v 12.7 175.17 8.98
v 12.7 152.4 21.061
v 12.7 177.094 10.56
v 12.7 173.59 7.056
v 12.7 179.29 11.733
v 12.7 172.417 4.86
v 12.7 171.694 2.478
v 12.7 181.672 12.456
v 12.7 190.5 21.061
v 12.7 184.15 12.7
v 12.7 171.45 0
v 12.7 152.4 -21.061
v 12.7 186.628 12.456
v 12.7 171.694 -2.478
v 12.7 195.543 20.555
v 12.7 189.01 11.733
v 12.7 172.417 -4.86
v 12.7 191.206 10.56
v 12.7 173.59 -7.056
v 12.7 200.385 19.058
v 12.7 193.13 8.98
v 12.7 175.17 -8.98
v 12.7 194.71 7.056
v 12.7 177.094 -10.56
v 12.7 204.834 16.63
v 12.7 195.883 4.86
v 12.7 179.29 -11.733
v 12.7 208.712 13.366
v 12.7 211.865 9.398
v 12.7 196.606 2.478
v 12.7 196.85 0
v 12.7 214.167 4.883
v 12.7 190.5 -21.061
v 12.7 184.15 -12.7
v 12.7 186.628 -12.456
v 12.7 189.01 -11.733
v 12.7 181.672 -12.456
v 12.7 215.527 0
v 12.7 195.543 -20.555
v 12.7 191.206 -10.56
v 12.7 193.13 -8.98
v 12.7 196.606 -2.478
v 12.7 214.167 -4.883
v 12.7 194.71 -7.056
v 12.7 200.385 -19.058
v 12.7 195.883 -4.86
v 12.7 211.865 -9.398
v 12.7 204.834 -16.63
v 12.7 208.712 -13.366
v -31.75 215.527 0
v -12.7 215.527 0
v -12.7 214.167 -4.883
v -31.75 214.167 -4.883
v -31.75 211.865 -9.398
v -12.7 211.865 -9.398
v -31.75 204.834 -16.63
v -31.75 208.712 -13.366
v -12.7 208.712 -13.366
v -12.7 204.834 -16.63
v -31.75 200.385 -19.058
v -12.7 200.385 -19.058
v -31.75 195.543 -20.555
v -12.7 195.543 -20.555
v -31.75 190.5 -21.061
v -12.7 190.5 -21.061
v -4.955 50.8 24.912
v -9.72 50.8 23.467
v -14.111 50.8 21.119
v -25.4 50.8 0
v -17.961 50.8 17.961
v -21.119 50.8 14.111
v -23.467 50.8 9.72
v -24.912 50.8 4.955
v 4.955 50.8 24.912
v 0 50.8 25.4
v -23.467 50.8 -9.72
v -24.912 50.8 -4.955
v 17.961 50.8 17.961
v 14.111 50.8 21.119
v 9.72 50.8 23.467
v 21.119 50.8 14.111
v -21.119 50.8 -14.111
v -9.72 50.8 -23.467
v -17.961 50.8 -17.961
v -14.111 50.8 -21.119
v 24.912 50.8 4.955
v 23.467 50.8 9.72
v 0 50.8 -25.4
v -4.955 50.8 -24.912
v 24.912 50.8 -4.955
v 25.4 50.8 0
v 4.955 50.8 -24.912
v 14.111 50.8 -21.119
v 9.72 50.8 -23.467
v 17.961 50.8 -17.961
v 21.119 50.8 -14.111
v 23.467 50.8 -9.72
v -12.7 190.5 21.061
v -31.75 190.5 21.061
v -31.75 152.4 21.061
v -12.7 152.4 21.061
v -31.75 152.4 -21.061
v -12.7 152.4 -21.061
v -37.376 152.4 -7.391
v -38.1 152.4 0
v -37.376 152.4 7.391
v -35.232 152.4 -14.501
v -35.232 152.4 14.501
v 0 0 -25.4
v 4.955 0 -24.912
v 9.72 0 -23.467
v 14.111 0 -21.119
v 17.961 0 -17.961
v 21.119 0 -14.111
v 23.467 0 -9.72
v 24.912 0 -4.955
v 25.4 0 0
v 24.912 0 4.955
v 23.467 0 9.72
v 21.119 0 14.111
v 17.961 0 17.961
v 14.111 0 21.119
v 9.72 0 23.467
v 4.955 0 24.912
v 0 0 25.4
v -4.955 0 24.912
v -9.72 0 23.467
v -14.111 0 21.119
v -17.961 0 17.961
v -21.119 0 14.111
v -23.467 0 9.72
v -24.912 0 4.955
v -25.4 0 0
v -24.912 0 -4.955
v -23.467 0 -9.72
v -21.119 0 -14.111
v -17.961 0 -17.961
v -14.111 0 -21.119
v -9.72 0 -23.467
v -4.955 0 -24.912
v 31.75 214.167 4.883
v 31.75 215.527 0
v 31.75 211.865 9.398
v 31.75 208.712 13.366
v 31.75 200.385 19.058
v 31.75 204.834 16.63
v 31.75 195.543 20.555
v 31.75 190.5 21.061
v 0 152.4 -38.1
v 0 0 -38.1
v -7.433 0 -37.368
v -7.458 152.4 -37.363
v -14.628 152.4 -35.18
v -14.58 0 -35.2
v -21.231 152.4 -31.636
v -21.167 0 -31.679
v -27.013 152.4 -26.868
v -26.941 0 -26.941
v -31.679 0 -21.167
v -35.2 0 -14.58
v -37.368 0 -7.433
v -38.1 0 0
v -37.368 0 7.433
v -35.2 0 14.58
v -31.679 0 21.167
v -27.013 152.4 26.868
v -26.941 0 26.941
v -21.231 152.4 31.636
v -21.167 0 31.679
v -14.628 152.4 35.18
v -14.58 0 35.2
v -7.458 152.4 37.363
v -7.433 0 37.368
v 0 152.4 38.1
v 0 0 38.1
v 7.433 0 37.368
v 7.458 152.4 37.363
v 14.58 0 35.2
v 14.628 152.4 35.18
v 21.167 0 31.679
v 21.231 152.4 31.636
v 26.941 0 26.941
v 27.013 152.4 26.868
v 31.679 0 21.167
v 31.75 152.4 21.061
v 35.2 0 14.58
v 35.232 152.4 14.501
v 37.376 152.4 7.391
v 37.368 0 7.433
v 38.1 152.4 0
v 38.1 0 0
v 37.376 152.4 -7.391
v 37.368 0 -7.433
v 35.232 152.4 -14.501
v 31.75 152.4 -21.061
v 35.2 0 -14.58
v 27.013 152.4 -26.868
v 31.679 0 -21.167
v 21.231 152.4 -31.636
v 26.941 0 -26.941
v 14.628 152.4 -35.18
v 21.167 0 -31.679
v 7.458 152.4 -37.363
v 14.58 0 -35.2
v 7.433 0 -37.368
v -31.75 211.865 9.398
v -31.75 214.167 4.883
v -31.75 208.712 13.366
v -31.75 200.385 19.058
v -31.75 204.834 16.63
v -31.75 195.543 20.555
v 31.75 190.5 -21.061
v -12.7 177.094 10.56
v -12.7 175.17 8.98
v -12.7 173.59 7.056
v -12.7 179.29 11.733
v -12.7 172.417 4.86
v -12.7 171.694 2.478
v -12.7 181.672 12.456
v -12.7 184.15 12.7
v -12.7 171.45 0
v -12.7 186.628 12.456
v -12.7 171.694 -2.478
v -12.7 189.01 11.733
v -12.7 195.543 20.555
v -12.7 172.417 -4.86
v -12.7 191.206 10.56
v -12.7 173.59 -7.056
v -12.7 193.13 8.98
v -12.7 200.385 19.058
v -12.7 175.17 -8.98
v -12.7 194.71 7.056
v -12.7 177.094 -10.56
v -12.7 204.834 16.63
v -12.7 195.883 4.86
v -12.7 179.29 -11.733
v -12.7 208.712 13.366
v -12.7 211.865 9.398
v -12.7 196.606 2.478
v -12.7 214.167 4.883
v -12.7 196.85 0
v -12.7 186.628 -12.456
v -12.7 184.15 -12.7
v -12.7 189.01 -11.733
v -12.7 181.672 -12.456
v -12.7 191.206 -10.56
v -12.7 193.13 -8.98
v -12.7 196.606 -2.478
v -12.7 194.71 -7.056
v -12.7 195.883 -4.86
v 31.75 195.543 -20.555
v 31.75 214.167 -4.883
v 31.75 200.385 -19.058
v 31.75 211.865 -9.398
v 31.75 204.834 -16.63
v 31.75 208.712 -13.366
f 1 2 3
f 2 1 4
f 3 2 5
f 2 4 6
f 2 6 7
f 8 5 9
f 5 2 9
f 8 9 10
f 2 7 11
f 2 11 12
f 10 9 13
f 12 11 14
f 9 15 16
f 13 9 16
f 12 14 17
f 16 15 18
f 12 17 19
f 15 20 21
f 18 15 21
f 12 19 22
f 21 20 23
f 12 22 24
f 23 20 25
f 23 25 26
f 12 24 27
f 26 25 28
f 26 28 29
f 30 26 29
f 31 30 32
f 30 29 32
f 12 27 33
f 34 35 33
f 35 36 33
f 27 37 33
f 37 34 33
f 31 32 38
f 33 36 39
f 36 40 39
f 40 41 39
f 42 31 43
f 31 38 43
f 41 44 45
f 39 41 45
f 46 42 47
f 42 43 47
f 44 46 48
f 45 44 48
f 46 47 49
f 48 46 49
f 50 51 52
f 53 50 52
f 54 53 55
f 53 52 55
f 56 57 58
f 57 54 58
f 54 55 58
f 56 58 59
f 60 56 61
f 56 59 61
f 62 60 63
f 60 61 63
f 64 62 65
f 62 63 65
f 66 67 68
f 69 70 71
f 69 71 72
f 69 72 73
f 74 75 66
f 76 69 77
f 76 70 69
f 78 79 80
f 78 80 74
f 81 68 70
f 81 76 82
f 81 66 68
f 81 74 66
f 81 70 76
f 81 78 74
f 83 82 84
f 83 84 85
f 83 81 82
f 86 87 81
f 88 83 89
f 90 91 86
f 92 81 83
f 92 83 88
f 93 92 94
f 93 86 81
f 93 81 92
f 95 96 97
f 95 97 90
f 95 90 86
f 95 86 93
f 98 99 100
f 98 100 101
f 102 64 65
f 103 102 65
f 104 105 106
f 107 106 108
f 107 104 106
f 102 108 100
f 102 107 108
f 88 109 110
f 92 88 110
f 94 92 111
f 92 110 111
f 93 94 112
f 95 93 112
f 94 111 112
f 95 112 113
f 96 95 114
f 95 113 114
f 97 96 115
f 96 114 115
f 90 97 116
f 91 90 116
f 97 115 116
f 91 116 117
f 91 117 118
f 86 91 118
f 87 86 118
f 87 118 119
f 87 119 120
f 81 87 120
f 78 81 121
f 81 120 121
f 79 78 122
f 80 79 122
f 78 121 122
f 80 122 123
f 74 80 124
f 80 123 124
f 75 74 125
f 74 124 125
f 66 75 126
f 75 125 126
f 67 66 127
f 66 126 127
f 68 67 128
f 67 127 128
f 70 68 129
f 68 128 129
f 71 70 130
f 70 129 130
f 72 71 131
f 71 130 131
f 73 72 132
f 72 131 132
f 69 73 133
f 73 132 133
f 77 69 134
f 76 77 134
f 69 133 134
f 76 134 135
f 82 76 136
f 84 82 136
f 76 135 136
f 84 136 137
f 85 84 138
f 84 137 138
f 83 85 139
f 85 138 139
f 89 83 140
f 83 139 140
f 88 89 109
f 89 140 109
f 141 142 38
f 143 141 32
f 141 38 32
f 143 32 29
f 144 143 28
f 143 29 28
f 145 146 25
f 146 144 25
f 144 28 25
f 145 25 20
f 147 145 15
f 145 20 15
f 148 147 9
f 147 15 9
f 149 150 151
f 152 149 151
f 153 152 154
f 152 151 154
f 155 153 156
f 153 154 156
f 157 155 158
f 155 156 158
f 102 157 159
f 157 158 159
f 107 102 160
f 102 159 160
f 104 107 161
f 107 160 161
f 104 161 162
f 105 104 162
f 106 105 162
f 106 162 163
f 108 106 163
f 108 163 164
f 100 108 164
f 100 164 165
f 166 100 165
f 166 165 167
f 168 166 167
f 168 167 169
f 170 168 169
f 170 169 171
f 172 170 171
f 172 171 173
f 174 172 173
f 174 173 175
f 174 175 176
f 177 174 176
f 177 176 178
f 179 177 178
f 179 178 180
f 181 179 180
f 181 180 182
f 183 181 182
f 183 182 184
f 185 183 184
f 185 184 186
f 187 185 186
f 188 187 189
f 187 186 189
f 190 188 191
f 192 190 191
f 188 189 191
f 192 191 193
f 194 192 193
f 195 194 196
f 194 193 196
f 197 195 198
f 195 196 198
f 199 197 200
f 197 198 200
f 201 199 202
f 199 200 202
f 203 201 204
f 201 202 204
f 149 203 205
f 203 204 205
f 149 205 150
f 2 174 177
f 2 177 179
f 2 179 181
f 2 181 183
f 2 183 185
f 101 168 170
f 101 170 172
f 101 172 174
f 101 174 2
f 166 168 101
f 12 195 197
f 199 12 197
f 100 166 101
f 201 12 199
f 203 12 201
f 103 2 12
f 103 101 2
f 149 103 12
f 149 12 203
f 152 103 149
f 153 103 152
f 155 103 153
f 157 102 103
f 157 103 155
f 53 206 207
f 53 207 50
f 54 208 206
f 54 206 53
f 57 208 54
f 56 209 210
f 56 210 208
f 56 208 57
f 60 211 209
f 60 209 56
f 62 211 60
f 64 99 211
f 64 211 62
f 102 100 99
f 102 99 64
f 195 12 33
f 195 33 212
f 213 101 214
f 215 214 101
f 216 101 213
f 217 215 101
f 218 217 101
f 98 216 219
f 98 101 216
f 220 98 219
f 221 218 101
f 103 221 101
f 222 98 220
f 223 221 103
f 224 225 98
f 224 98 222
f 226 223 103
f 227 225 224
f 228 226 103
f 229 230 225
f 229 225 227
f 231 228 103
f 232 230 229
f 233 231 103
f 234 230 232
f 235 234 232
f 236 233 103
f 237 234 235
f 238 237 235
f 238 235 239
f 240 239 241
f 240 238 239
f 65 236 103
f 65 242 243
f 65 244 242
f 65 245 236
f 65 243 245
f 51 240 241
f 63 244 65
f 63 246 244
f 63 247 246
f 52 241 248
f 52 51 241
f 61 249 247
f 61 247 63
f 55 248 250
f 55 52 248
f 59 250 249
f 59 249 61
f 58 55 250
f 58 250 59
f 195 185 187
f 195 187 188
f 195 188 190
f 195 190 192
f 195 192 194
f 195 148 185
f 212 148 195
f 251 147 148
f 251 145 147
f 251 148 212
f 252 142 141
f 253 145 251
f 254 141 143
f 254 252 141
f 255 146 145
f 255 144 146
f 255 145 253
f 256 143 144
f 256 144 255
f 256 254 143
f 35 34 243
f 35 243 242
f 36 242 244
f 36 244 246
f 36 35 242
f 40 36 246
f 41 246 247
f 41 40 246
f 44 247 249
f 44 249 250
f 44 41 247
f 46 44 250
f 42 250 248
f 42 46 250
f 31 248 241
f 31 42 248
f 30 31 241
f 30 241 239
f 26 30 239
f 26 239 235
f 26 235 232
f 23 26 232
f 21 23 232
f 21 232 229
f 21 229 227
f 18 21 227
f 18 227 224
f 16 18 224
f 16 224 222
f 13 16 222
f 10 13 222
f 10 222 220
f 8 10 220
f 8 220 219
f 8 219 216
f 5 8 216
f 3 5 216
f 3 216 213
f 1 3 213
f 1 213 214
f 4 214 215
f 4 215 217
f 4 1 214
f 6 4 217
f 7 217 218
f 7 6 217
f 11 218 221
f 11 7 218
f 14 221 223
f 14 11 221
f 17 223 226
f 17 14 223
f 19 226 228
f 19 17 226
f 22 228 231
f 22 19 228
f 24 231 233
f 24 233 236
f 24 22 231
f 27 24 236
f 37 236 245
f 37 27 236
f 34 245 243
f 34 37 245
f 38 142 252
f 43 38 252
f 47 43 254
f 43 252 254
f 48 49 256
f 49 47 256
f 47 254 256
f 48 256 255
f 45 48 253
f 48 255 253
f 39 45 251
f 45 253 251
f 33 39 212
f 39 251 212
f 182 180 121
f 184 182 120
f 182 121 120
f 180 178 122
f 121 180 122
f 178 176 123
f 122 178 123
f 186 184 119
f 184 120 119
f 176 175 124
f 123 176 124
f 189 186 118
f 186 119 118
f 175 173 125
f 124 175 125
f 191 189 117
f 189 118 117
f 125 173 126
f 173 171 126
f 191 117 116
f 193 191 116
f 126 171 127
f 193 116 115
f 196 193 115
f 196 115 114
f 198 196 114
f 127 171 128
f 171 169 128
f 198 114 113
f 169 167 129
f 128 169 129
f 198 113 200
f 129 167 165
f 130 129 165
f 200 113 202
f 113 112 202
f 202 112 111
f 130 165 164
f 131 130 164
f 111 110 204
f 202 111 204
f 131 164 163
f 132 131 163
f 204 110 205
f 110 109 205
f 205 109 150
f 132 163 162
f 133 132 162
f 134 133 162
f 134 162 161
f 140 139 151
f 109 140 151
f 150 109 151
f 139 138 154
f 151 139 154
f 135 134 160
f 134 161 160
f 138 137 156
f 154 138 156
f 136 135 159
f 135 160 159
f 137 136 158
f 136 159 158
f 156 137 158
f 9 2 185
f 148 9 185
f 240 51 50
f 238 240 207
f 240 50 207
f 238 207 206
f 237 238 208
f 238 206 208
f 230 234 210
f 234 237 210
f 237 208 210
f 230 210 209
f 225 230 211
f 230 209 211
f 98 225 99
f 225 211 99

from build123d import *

# Parameters (mm, degrees)
SKETCH1_R           = 38.1
BOSS_EXTRUDE1_DEPTH = 152.4
SKETCH2_W           = 63.5
SKETCH2_H           = 42.121134838
BOSS_EXTRUDE2_DEPTH = 63.5
SKETCH3_W           = 25.4
SKETCH3_H           = 42.121134838
CUT_EXTRUDE1_DEPTH  = 63.5
FILLET1_R           = 25.4
SKETCH5_R           = 25.4
CUT_EXTRUDE3_DEPTH  = 50.8
SKETCH4_R           = 12.7
BOSS_EXTRUDE3_DEPTH = 52.578


with BuildPart() as part:
    # Sketch1 → Boss-Extrude1 (new body)
    with BuildSketch(Plane(origin=(0, 0, 0), x_dir=(1, 0, 0), z_dir=(0, 1, 0))):
        with Locations(Location((0, 0, 0), (0, 0, 90))):
            Circle(SKETCH1_R)
    extrude(amount=BOSS_EXTRUDE1_DEPTH)

    # Sketch2 → Boss-Extrude2 (add)
    with BuildSketch(Plane(origin=(0, 152.4, 0), x_dir=(1, 0, 0), z_dir=(0, 1, 0))):
        Rectangle(SKETCH2_W, SKETCH2_H)
    extrude(amount=BOSS_EXTRUDE2_DEPTH)

    # Sketch3 → Cut-Extrude1 (cut)
    with BuildSketch(Plane(origin=(0, 215.9, 0), x_dir=(1, 0, 0), z_dir=(0, 1, 0))):
        Rectangle(SKETCH3_W, SKETCH3_H)
    extrude(amount=-CUT_EXTRUDE1_DEPTH, mode=Mode.SUBTRACT)

    # Fillet1
    # the kernel refuses this fillet: 25.4 mm, written as the material it takes off along each edge
    with BuildSketch(Plane(origin=(50.8, 215.9, -21.060567419), x_dir=(0, -1, 0), z_dir=(-1, 0, 0)), Plane(origin=(-95.25, 215.9, 21.060567419), x_dir=(0, -1, 0), z_dir=(1, 0, 0)), Plane(origin=(95.25, 215.9, -21.060567419), x_dir=(0, -1, 0), z_dir=(-1, 0, 0)), Plane(origin=(-50.8, 215.9, 21.060567419), x_dir=(0, -1, 0), z_dir=(1, 0, 0))) as fillet1_piece_1:
        with BuildLine():
            CenterArc((FILLET1_R, FILLET1_R), FILLET1_R, 180, 90)
            Line((0, FILLET1_R), (0, 0))
            Line((0, 0), (FILLET1_R, 0))
        make_face()
    extrude(amount=146.05, mode=Mode.SUBTRACT)

    # Sketch5 → Cut-Extrude3 (cut)
    with BuildSketch(Plane.XZ):
        with Locations(Location((0, 0, 0), (0, 0, 270))):
            Circle(SKETCH5_R)
    extrude(amount=-CUT_EXTRUDE3_DEPTH, mode=Mode.SUBTRACT)

    # Sketch4 → Boss-Extrude3 (add)
    with BuildSketch(Plane(origin=(31.75, 0, 0), x_dir=(0, 0, -1), z_dir=(1, 0, 0))):
        with Locations((0, 184.15)):
            Circle(SKETCH4_R)
    extrude(amount=-BOSS_EXTRUDE3_DEPTH)


solid = part.part
